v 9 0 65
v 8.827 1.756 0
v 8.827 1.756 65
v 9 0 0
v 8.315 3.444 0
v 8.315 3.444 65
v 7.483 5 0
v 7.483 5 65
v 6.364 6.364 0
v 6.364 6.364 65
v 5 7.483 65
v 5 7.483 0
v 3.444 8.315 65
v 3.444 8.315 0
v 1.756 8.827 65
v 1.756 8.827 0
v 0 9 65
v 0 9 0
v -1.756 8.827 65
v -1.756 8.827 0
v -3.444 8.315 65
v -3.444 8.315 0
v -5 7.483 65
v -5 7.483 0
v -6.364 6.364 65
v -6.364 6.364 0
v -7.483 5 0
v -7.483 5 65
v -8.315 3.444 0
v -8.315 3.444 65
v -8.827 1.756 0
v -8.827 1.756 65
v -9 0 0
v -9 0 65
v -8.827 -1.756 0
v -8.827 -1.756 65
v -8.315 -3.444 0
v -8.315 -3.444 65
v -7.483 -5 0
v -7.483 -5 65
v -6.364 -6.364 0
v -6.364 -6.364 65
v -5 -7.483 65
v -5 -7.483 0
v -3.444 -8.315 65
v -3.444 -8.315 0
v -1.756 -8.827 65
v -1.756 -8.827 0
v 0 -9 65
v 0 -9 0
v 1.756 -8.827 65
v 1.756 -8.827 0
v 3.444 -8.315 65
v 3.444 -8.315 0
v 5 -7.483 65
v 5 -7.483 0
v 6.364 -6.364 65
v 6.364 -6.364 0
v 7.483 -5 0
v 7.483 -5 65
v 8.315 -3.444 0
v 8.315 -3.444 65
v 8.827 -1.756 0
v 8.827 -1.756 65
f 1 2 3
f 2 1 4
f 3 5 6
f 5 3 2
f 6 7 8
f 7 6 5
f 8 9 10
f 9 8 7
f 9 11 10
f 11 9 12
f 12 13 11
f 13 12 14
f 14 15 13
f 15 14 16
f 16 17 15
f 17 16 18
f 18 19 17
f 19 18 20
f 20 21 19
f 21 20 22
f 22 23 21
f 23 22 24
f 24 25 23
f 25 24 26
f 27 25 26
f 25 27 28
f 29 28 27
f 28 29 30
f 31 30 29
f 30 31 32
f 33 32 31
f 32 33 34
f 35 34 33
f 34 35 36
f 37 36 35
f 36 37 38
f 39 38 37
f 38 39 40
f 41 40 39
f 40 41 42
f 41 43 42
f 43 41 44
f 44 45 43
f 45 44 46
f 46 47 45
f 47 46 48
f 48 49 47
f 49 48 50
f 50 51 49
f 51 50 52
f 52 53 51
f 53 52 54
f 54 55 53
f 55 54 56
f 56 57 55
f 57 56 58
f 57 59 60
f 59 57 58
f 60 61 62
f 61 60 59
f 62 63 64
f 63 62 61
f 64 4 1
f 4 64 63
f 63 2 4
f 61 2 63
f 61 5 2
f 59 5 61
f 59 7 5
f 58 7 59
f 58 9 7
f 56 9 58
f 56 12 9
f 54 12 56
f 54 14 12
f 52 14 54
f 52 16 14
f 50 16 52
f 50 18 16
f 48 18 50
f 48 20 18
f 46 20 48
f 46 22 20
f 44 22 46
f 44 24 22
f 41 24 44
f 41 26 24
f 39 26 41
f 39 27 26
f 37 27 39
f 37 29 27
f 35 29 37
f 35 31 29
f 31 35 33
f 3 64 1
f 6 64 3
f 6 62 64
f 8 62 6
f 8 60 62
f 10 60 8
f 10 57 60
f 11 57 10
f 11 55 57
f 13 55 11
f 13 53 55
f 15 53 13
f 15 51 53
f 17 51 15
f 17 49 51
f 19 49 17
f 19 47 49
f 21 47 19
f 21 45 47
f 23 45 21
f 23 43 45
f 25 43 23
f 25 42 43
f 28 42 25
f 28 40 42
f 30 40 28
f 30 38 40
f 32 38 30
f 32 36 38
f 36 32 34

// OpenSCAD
echo("Работа Асыловой Анастасии");



akkum18650();

module akkum18650(){
    color("purple")
    cylinder(d=18, h=65, $fn=32);
}
